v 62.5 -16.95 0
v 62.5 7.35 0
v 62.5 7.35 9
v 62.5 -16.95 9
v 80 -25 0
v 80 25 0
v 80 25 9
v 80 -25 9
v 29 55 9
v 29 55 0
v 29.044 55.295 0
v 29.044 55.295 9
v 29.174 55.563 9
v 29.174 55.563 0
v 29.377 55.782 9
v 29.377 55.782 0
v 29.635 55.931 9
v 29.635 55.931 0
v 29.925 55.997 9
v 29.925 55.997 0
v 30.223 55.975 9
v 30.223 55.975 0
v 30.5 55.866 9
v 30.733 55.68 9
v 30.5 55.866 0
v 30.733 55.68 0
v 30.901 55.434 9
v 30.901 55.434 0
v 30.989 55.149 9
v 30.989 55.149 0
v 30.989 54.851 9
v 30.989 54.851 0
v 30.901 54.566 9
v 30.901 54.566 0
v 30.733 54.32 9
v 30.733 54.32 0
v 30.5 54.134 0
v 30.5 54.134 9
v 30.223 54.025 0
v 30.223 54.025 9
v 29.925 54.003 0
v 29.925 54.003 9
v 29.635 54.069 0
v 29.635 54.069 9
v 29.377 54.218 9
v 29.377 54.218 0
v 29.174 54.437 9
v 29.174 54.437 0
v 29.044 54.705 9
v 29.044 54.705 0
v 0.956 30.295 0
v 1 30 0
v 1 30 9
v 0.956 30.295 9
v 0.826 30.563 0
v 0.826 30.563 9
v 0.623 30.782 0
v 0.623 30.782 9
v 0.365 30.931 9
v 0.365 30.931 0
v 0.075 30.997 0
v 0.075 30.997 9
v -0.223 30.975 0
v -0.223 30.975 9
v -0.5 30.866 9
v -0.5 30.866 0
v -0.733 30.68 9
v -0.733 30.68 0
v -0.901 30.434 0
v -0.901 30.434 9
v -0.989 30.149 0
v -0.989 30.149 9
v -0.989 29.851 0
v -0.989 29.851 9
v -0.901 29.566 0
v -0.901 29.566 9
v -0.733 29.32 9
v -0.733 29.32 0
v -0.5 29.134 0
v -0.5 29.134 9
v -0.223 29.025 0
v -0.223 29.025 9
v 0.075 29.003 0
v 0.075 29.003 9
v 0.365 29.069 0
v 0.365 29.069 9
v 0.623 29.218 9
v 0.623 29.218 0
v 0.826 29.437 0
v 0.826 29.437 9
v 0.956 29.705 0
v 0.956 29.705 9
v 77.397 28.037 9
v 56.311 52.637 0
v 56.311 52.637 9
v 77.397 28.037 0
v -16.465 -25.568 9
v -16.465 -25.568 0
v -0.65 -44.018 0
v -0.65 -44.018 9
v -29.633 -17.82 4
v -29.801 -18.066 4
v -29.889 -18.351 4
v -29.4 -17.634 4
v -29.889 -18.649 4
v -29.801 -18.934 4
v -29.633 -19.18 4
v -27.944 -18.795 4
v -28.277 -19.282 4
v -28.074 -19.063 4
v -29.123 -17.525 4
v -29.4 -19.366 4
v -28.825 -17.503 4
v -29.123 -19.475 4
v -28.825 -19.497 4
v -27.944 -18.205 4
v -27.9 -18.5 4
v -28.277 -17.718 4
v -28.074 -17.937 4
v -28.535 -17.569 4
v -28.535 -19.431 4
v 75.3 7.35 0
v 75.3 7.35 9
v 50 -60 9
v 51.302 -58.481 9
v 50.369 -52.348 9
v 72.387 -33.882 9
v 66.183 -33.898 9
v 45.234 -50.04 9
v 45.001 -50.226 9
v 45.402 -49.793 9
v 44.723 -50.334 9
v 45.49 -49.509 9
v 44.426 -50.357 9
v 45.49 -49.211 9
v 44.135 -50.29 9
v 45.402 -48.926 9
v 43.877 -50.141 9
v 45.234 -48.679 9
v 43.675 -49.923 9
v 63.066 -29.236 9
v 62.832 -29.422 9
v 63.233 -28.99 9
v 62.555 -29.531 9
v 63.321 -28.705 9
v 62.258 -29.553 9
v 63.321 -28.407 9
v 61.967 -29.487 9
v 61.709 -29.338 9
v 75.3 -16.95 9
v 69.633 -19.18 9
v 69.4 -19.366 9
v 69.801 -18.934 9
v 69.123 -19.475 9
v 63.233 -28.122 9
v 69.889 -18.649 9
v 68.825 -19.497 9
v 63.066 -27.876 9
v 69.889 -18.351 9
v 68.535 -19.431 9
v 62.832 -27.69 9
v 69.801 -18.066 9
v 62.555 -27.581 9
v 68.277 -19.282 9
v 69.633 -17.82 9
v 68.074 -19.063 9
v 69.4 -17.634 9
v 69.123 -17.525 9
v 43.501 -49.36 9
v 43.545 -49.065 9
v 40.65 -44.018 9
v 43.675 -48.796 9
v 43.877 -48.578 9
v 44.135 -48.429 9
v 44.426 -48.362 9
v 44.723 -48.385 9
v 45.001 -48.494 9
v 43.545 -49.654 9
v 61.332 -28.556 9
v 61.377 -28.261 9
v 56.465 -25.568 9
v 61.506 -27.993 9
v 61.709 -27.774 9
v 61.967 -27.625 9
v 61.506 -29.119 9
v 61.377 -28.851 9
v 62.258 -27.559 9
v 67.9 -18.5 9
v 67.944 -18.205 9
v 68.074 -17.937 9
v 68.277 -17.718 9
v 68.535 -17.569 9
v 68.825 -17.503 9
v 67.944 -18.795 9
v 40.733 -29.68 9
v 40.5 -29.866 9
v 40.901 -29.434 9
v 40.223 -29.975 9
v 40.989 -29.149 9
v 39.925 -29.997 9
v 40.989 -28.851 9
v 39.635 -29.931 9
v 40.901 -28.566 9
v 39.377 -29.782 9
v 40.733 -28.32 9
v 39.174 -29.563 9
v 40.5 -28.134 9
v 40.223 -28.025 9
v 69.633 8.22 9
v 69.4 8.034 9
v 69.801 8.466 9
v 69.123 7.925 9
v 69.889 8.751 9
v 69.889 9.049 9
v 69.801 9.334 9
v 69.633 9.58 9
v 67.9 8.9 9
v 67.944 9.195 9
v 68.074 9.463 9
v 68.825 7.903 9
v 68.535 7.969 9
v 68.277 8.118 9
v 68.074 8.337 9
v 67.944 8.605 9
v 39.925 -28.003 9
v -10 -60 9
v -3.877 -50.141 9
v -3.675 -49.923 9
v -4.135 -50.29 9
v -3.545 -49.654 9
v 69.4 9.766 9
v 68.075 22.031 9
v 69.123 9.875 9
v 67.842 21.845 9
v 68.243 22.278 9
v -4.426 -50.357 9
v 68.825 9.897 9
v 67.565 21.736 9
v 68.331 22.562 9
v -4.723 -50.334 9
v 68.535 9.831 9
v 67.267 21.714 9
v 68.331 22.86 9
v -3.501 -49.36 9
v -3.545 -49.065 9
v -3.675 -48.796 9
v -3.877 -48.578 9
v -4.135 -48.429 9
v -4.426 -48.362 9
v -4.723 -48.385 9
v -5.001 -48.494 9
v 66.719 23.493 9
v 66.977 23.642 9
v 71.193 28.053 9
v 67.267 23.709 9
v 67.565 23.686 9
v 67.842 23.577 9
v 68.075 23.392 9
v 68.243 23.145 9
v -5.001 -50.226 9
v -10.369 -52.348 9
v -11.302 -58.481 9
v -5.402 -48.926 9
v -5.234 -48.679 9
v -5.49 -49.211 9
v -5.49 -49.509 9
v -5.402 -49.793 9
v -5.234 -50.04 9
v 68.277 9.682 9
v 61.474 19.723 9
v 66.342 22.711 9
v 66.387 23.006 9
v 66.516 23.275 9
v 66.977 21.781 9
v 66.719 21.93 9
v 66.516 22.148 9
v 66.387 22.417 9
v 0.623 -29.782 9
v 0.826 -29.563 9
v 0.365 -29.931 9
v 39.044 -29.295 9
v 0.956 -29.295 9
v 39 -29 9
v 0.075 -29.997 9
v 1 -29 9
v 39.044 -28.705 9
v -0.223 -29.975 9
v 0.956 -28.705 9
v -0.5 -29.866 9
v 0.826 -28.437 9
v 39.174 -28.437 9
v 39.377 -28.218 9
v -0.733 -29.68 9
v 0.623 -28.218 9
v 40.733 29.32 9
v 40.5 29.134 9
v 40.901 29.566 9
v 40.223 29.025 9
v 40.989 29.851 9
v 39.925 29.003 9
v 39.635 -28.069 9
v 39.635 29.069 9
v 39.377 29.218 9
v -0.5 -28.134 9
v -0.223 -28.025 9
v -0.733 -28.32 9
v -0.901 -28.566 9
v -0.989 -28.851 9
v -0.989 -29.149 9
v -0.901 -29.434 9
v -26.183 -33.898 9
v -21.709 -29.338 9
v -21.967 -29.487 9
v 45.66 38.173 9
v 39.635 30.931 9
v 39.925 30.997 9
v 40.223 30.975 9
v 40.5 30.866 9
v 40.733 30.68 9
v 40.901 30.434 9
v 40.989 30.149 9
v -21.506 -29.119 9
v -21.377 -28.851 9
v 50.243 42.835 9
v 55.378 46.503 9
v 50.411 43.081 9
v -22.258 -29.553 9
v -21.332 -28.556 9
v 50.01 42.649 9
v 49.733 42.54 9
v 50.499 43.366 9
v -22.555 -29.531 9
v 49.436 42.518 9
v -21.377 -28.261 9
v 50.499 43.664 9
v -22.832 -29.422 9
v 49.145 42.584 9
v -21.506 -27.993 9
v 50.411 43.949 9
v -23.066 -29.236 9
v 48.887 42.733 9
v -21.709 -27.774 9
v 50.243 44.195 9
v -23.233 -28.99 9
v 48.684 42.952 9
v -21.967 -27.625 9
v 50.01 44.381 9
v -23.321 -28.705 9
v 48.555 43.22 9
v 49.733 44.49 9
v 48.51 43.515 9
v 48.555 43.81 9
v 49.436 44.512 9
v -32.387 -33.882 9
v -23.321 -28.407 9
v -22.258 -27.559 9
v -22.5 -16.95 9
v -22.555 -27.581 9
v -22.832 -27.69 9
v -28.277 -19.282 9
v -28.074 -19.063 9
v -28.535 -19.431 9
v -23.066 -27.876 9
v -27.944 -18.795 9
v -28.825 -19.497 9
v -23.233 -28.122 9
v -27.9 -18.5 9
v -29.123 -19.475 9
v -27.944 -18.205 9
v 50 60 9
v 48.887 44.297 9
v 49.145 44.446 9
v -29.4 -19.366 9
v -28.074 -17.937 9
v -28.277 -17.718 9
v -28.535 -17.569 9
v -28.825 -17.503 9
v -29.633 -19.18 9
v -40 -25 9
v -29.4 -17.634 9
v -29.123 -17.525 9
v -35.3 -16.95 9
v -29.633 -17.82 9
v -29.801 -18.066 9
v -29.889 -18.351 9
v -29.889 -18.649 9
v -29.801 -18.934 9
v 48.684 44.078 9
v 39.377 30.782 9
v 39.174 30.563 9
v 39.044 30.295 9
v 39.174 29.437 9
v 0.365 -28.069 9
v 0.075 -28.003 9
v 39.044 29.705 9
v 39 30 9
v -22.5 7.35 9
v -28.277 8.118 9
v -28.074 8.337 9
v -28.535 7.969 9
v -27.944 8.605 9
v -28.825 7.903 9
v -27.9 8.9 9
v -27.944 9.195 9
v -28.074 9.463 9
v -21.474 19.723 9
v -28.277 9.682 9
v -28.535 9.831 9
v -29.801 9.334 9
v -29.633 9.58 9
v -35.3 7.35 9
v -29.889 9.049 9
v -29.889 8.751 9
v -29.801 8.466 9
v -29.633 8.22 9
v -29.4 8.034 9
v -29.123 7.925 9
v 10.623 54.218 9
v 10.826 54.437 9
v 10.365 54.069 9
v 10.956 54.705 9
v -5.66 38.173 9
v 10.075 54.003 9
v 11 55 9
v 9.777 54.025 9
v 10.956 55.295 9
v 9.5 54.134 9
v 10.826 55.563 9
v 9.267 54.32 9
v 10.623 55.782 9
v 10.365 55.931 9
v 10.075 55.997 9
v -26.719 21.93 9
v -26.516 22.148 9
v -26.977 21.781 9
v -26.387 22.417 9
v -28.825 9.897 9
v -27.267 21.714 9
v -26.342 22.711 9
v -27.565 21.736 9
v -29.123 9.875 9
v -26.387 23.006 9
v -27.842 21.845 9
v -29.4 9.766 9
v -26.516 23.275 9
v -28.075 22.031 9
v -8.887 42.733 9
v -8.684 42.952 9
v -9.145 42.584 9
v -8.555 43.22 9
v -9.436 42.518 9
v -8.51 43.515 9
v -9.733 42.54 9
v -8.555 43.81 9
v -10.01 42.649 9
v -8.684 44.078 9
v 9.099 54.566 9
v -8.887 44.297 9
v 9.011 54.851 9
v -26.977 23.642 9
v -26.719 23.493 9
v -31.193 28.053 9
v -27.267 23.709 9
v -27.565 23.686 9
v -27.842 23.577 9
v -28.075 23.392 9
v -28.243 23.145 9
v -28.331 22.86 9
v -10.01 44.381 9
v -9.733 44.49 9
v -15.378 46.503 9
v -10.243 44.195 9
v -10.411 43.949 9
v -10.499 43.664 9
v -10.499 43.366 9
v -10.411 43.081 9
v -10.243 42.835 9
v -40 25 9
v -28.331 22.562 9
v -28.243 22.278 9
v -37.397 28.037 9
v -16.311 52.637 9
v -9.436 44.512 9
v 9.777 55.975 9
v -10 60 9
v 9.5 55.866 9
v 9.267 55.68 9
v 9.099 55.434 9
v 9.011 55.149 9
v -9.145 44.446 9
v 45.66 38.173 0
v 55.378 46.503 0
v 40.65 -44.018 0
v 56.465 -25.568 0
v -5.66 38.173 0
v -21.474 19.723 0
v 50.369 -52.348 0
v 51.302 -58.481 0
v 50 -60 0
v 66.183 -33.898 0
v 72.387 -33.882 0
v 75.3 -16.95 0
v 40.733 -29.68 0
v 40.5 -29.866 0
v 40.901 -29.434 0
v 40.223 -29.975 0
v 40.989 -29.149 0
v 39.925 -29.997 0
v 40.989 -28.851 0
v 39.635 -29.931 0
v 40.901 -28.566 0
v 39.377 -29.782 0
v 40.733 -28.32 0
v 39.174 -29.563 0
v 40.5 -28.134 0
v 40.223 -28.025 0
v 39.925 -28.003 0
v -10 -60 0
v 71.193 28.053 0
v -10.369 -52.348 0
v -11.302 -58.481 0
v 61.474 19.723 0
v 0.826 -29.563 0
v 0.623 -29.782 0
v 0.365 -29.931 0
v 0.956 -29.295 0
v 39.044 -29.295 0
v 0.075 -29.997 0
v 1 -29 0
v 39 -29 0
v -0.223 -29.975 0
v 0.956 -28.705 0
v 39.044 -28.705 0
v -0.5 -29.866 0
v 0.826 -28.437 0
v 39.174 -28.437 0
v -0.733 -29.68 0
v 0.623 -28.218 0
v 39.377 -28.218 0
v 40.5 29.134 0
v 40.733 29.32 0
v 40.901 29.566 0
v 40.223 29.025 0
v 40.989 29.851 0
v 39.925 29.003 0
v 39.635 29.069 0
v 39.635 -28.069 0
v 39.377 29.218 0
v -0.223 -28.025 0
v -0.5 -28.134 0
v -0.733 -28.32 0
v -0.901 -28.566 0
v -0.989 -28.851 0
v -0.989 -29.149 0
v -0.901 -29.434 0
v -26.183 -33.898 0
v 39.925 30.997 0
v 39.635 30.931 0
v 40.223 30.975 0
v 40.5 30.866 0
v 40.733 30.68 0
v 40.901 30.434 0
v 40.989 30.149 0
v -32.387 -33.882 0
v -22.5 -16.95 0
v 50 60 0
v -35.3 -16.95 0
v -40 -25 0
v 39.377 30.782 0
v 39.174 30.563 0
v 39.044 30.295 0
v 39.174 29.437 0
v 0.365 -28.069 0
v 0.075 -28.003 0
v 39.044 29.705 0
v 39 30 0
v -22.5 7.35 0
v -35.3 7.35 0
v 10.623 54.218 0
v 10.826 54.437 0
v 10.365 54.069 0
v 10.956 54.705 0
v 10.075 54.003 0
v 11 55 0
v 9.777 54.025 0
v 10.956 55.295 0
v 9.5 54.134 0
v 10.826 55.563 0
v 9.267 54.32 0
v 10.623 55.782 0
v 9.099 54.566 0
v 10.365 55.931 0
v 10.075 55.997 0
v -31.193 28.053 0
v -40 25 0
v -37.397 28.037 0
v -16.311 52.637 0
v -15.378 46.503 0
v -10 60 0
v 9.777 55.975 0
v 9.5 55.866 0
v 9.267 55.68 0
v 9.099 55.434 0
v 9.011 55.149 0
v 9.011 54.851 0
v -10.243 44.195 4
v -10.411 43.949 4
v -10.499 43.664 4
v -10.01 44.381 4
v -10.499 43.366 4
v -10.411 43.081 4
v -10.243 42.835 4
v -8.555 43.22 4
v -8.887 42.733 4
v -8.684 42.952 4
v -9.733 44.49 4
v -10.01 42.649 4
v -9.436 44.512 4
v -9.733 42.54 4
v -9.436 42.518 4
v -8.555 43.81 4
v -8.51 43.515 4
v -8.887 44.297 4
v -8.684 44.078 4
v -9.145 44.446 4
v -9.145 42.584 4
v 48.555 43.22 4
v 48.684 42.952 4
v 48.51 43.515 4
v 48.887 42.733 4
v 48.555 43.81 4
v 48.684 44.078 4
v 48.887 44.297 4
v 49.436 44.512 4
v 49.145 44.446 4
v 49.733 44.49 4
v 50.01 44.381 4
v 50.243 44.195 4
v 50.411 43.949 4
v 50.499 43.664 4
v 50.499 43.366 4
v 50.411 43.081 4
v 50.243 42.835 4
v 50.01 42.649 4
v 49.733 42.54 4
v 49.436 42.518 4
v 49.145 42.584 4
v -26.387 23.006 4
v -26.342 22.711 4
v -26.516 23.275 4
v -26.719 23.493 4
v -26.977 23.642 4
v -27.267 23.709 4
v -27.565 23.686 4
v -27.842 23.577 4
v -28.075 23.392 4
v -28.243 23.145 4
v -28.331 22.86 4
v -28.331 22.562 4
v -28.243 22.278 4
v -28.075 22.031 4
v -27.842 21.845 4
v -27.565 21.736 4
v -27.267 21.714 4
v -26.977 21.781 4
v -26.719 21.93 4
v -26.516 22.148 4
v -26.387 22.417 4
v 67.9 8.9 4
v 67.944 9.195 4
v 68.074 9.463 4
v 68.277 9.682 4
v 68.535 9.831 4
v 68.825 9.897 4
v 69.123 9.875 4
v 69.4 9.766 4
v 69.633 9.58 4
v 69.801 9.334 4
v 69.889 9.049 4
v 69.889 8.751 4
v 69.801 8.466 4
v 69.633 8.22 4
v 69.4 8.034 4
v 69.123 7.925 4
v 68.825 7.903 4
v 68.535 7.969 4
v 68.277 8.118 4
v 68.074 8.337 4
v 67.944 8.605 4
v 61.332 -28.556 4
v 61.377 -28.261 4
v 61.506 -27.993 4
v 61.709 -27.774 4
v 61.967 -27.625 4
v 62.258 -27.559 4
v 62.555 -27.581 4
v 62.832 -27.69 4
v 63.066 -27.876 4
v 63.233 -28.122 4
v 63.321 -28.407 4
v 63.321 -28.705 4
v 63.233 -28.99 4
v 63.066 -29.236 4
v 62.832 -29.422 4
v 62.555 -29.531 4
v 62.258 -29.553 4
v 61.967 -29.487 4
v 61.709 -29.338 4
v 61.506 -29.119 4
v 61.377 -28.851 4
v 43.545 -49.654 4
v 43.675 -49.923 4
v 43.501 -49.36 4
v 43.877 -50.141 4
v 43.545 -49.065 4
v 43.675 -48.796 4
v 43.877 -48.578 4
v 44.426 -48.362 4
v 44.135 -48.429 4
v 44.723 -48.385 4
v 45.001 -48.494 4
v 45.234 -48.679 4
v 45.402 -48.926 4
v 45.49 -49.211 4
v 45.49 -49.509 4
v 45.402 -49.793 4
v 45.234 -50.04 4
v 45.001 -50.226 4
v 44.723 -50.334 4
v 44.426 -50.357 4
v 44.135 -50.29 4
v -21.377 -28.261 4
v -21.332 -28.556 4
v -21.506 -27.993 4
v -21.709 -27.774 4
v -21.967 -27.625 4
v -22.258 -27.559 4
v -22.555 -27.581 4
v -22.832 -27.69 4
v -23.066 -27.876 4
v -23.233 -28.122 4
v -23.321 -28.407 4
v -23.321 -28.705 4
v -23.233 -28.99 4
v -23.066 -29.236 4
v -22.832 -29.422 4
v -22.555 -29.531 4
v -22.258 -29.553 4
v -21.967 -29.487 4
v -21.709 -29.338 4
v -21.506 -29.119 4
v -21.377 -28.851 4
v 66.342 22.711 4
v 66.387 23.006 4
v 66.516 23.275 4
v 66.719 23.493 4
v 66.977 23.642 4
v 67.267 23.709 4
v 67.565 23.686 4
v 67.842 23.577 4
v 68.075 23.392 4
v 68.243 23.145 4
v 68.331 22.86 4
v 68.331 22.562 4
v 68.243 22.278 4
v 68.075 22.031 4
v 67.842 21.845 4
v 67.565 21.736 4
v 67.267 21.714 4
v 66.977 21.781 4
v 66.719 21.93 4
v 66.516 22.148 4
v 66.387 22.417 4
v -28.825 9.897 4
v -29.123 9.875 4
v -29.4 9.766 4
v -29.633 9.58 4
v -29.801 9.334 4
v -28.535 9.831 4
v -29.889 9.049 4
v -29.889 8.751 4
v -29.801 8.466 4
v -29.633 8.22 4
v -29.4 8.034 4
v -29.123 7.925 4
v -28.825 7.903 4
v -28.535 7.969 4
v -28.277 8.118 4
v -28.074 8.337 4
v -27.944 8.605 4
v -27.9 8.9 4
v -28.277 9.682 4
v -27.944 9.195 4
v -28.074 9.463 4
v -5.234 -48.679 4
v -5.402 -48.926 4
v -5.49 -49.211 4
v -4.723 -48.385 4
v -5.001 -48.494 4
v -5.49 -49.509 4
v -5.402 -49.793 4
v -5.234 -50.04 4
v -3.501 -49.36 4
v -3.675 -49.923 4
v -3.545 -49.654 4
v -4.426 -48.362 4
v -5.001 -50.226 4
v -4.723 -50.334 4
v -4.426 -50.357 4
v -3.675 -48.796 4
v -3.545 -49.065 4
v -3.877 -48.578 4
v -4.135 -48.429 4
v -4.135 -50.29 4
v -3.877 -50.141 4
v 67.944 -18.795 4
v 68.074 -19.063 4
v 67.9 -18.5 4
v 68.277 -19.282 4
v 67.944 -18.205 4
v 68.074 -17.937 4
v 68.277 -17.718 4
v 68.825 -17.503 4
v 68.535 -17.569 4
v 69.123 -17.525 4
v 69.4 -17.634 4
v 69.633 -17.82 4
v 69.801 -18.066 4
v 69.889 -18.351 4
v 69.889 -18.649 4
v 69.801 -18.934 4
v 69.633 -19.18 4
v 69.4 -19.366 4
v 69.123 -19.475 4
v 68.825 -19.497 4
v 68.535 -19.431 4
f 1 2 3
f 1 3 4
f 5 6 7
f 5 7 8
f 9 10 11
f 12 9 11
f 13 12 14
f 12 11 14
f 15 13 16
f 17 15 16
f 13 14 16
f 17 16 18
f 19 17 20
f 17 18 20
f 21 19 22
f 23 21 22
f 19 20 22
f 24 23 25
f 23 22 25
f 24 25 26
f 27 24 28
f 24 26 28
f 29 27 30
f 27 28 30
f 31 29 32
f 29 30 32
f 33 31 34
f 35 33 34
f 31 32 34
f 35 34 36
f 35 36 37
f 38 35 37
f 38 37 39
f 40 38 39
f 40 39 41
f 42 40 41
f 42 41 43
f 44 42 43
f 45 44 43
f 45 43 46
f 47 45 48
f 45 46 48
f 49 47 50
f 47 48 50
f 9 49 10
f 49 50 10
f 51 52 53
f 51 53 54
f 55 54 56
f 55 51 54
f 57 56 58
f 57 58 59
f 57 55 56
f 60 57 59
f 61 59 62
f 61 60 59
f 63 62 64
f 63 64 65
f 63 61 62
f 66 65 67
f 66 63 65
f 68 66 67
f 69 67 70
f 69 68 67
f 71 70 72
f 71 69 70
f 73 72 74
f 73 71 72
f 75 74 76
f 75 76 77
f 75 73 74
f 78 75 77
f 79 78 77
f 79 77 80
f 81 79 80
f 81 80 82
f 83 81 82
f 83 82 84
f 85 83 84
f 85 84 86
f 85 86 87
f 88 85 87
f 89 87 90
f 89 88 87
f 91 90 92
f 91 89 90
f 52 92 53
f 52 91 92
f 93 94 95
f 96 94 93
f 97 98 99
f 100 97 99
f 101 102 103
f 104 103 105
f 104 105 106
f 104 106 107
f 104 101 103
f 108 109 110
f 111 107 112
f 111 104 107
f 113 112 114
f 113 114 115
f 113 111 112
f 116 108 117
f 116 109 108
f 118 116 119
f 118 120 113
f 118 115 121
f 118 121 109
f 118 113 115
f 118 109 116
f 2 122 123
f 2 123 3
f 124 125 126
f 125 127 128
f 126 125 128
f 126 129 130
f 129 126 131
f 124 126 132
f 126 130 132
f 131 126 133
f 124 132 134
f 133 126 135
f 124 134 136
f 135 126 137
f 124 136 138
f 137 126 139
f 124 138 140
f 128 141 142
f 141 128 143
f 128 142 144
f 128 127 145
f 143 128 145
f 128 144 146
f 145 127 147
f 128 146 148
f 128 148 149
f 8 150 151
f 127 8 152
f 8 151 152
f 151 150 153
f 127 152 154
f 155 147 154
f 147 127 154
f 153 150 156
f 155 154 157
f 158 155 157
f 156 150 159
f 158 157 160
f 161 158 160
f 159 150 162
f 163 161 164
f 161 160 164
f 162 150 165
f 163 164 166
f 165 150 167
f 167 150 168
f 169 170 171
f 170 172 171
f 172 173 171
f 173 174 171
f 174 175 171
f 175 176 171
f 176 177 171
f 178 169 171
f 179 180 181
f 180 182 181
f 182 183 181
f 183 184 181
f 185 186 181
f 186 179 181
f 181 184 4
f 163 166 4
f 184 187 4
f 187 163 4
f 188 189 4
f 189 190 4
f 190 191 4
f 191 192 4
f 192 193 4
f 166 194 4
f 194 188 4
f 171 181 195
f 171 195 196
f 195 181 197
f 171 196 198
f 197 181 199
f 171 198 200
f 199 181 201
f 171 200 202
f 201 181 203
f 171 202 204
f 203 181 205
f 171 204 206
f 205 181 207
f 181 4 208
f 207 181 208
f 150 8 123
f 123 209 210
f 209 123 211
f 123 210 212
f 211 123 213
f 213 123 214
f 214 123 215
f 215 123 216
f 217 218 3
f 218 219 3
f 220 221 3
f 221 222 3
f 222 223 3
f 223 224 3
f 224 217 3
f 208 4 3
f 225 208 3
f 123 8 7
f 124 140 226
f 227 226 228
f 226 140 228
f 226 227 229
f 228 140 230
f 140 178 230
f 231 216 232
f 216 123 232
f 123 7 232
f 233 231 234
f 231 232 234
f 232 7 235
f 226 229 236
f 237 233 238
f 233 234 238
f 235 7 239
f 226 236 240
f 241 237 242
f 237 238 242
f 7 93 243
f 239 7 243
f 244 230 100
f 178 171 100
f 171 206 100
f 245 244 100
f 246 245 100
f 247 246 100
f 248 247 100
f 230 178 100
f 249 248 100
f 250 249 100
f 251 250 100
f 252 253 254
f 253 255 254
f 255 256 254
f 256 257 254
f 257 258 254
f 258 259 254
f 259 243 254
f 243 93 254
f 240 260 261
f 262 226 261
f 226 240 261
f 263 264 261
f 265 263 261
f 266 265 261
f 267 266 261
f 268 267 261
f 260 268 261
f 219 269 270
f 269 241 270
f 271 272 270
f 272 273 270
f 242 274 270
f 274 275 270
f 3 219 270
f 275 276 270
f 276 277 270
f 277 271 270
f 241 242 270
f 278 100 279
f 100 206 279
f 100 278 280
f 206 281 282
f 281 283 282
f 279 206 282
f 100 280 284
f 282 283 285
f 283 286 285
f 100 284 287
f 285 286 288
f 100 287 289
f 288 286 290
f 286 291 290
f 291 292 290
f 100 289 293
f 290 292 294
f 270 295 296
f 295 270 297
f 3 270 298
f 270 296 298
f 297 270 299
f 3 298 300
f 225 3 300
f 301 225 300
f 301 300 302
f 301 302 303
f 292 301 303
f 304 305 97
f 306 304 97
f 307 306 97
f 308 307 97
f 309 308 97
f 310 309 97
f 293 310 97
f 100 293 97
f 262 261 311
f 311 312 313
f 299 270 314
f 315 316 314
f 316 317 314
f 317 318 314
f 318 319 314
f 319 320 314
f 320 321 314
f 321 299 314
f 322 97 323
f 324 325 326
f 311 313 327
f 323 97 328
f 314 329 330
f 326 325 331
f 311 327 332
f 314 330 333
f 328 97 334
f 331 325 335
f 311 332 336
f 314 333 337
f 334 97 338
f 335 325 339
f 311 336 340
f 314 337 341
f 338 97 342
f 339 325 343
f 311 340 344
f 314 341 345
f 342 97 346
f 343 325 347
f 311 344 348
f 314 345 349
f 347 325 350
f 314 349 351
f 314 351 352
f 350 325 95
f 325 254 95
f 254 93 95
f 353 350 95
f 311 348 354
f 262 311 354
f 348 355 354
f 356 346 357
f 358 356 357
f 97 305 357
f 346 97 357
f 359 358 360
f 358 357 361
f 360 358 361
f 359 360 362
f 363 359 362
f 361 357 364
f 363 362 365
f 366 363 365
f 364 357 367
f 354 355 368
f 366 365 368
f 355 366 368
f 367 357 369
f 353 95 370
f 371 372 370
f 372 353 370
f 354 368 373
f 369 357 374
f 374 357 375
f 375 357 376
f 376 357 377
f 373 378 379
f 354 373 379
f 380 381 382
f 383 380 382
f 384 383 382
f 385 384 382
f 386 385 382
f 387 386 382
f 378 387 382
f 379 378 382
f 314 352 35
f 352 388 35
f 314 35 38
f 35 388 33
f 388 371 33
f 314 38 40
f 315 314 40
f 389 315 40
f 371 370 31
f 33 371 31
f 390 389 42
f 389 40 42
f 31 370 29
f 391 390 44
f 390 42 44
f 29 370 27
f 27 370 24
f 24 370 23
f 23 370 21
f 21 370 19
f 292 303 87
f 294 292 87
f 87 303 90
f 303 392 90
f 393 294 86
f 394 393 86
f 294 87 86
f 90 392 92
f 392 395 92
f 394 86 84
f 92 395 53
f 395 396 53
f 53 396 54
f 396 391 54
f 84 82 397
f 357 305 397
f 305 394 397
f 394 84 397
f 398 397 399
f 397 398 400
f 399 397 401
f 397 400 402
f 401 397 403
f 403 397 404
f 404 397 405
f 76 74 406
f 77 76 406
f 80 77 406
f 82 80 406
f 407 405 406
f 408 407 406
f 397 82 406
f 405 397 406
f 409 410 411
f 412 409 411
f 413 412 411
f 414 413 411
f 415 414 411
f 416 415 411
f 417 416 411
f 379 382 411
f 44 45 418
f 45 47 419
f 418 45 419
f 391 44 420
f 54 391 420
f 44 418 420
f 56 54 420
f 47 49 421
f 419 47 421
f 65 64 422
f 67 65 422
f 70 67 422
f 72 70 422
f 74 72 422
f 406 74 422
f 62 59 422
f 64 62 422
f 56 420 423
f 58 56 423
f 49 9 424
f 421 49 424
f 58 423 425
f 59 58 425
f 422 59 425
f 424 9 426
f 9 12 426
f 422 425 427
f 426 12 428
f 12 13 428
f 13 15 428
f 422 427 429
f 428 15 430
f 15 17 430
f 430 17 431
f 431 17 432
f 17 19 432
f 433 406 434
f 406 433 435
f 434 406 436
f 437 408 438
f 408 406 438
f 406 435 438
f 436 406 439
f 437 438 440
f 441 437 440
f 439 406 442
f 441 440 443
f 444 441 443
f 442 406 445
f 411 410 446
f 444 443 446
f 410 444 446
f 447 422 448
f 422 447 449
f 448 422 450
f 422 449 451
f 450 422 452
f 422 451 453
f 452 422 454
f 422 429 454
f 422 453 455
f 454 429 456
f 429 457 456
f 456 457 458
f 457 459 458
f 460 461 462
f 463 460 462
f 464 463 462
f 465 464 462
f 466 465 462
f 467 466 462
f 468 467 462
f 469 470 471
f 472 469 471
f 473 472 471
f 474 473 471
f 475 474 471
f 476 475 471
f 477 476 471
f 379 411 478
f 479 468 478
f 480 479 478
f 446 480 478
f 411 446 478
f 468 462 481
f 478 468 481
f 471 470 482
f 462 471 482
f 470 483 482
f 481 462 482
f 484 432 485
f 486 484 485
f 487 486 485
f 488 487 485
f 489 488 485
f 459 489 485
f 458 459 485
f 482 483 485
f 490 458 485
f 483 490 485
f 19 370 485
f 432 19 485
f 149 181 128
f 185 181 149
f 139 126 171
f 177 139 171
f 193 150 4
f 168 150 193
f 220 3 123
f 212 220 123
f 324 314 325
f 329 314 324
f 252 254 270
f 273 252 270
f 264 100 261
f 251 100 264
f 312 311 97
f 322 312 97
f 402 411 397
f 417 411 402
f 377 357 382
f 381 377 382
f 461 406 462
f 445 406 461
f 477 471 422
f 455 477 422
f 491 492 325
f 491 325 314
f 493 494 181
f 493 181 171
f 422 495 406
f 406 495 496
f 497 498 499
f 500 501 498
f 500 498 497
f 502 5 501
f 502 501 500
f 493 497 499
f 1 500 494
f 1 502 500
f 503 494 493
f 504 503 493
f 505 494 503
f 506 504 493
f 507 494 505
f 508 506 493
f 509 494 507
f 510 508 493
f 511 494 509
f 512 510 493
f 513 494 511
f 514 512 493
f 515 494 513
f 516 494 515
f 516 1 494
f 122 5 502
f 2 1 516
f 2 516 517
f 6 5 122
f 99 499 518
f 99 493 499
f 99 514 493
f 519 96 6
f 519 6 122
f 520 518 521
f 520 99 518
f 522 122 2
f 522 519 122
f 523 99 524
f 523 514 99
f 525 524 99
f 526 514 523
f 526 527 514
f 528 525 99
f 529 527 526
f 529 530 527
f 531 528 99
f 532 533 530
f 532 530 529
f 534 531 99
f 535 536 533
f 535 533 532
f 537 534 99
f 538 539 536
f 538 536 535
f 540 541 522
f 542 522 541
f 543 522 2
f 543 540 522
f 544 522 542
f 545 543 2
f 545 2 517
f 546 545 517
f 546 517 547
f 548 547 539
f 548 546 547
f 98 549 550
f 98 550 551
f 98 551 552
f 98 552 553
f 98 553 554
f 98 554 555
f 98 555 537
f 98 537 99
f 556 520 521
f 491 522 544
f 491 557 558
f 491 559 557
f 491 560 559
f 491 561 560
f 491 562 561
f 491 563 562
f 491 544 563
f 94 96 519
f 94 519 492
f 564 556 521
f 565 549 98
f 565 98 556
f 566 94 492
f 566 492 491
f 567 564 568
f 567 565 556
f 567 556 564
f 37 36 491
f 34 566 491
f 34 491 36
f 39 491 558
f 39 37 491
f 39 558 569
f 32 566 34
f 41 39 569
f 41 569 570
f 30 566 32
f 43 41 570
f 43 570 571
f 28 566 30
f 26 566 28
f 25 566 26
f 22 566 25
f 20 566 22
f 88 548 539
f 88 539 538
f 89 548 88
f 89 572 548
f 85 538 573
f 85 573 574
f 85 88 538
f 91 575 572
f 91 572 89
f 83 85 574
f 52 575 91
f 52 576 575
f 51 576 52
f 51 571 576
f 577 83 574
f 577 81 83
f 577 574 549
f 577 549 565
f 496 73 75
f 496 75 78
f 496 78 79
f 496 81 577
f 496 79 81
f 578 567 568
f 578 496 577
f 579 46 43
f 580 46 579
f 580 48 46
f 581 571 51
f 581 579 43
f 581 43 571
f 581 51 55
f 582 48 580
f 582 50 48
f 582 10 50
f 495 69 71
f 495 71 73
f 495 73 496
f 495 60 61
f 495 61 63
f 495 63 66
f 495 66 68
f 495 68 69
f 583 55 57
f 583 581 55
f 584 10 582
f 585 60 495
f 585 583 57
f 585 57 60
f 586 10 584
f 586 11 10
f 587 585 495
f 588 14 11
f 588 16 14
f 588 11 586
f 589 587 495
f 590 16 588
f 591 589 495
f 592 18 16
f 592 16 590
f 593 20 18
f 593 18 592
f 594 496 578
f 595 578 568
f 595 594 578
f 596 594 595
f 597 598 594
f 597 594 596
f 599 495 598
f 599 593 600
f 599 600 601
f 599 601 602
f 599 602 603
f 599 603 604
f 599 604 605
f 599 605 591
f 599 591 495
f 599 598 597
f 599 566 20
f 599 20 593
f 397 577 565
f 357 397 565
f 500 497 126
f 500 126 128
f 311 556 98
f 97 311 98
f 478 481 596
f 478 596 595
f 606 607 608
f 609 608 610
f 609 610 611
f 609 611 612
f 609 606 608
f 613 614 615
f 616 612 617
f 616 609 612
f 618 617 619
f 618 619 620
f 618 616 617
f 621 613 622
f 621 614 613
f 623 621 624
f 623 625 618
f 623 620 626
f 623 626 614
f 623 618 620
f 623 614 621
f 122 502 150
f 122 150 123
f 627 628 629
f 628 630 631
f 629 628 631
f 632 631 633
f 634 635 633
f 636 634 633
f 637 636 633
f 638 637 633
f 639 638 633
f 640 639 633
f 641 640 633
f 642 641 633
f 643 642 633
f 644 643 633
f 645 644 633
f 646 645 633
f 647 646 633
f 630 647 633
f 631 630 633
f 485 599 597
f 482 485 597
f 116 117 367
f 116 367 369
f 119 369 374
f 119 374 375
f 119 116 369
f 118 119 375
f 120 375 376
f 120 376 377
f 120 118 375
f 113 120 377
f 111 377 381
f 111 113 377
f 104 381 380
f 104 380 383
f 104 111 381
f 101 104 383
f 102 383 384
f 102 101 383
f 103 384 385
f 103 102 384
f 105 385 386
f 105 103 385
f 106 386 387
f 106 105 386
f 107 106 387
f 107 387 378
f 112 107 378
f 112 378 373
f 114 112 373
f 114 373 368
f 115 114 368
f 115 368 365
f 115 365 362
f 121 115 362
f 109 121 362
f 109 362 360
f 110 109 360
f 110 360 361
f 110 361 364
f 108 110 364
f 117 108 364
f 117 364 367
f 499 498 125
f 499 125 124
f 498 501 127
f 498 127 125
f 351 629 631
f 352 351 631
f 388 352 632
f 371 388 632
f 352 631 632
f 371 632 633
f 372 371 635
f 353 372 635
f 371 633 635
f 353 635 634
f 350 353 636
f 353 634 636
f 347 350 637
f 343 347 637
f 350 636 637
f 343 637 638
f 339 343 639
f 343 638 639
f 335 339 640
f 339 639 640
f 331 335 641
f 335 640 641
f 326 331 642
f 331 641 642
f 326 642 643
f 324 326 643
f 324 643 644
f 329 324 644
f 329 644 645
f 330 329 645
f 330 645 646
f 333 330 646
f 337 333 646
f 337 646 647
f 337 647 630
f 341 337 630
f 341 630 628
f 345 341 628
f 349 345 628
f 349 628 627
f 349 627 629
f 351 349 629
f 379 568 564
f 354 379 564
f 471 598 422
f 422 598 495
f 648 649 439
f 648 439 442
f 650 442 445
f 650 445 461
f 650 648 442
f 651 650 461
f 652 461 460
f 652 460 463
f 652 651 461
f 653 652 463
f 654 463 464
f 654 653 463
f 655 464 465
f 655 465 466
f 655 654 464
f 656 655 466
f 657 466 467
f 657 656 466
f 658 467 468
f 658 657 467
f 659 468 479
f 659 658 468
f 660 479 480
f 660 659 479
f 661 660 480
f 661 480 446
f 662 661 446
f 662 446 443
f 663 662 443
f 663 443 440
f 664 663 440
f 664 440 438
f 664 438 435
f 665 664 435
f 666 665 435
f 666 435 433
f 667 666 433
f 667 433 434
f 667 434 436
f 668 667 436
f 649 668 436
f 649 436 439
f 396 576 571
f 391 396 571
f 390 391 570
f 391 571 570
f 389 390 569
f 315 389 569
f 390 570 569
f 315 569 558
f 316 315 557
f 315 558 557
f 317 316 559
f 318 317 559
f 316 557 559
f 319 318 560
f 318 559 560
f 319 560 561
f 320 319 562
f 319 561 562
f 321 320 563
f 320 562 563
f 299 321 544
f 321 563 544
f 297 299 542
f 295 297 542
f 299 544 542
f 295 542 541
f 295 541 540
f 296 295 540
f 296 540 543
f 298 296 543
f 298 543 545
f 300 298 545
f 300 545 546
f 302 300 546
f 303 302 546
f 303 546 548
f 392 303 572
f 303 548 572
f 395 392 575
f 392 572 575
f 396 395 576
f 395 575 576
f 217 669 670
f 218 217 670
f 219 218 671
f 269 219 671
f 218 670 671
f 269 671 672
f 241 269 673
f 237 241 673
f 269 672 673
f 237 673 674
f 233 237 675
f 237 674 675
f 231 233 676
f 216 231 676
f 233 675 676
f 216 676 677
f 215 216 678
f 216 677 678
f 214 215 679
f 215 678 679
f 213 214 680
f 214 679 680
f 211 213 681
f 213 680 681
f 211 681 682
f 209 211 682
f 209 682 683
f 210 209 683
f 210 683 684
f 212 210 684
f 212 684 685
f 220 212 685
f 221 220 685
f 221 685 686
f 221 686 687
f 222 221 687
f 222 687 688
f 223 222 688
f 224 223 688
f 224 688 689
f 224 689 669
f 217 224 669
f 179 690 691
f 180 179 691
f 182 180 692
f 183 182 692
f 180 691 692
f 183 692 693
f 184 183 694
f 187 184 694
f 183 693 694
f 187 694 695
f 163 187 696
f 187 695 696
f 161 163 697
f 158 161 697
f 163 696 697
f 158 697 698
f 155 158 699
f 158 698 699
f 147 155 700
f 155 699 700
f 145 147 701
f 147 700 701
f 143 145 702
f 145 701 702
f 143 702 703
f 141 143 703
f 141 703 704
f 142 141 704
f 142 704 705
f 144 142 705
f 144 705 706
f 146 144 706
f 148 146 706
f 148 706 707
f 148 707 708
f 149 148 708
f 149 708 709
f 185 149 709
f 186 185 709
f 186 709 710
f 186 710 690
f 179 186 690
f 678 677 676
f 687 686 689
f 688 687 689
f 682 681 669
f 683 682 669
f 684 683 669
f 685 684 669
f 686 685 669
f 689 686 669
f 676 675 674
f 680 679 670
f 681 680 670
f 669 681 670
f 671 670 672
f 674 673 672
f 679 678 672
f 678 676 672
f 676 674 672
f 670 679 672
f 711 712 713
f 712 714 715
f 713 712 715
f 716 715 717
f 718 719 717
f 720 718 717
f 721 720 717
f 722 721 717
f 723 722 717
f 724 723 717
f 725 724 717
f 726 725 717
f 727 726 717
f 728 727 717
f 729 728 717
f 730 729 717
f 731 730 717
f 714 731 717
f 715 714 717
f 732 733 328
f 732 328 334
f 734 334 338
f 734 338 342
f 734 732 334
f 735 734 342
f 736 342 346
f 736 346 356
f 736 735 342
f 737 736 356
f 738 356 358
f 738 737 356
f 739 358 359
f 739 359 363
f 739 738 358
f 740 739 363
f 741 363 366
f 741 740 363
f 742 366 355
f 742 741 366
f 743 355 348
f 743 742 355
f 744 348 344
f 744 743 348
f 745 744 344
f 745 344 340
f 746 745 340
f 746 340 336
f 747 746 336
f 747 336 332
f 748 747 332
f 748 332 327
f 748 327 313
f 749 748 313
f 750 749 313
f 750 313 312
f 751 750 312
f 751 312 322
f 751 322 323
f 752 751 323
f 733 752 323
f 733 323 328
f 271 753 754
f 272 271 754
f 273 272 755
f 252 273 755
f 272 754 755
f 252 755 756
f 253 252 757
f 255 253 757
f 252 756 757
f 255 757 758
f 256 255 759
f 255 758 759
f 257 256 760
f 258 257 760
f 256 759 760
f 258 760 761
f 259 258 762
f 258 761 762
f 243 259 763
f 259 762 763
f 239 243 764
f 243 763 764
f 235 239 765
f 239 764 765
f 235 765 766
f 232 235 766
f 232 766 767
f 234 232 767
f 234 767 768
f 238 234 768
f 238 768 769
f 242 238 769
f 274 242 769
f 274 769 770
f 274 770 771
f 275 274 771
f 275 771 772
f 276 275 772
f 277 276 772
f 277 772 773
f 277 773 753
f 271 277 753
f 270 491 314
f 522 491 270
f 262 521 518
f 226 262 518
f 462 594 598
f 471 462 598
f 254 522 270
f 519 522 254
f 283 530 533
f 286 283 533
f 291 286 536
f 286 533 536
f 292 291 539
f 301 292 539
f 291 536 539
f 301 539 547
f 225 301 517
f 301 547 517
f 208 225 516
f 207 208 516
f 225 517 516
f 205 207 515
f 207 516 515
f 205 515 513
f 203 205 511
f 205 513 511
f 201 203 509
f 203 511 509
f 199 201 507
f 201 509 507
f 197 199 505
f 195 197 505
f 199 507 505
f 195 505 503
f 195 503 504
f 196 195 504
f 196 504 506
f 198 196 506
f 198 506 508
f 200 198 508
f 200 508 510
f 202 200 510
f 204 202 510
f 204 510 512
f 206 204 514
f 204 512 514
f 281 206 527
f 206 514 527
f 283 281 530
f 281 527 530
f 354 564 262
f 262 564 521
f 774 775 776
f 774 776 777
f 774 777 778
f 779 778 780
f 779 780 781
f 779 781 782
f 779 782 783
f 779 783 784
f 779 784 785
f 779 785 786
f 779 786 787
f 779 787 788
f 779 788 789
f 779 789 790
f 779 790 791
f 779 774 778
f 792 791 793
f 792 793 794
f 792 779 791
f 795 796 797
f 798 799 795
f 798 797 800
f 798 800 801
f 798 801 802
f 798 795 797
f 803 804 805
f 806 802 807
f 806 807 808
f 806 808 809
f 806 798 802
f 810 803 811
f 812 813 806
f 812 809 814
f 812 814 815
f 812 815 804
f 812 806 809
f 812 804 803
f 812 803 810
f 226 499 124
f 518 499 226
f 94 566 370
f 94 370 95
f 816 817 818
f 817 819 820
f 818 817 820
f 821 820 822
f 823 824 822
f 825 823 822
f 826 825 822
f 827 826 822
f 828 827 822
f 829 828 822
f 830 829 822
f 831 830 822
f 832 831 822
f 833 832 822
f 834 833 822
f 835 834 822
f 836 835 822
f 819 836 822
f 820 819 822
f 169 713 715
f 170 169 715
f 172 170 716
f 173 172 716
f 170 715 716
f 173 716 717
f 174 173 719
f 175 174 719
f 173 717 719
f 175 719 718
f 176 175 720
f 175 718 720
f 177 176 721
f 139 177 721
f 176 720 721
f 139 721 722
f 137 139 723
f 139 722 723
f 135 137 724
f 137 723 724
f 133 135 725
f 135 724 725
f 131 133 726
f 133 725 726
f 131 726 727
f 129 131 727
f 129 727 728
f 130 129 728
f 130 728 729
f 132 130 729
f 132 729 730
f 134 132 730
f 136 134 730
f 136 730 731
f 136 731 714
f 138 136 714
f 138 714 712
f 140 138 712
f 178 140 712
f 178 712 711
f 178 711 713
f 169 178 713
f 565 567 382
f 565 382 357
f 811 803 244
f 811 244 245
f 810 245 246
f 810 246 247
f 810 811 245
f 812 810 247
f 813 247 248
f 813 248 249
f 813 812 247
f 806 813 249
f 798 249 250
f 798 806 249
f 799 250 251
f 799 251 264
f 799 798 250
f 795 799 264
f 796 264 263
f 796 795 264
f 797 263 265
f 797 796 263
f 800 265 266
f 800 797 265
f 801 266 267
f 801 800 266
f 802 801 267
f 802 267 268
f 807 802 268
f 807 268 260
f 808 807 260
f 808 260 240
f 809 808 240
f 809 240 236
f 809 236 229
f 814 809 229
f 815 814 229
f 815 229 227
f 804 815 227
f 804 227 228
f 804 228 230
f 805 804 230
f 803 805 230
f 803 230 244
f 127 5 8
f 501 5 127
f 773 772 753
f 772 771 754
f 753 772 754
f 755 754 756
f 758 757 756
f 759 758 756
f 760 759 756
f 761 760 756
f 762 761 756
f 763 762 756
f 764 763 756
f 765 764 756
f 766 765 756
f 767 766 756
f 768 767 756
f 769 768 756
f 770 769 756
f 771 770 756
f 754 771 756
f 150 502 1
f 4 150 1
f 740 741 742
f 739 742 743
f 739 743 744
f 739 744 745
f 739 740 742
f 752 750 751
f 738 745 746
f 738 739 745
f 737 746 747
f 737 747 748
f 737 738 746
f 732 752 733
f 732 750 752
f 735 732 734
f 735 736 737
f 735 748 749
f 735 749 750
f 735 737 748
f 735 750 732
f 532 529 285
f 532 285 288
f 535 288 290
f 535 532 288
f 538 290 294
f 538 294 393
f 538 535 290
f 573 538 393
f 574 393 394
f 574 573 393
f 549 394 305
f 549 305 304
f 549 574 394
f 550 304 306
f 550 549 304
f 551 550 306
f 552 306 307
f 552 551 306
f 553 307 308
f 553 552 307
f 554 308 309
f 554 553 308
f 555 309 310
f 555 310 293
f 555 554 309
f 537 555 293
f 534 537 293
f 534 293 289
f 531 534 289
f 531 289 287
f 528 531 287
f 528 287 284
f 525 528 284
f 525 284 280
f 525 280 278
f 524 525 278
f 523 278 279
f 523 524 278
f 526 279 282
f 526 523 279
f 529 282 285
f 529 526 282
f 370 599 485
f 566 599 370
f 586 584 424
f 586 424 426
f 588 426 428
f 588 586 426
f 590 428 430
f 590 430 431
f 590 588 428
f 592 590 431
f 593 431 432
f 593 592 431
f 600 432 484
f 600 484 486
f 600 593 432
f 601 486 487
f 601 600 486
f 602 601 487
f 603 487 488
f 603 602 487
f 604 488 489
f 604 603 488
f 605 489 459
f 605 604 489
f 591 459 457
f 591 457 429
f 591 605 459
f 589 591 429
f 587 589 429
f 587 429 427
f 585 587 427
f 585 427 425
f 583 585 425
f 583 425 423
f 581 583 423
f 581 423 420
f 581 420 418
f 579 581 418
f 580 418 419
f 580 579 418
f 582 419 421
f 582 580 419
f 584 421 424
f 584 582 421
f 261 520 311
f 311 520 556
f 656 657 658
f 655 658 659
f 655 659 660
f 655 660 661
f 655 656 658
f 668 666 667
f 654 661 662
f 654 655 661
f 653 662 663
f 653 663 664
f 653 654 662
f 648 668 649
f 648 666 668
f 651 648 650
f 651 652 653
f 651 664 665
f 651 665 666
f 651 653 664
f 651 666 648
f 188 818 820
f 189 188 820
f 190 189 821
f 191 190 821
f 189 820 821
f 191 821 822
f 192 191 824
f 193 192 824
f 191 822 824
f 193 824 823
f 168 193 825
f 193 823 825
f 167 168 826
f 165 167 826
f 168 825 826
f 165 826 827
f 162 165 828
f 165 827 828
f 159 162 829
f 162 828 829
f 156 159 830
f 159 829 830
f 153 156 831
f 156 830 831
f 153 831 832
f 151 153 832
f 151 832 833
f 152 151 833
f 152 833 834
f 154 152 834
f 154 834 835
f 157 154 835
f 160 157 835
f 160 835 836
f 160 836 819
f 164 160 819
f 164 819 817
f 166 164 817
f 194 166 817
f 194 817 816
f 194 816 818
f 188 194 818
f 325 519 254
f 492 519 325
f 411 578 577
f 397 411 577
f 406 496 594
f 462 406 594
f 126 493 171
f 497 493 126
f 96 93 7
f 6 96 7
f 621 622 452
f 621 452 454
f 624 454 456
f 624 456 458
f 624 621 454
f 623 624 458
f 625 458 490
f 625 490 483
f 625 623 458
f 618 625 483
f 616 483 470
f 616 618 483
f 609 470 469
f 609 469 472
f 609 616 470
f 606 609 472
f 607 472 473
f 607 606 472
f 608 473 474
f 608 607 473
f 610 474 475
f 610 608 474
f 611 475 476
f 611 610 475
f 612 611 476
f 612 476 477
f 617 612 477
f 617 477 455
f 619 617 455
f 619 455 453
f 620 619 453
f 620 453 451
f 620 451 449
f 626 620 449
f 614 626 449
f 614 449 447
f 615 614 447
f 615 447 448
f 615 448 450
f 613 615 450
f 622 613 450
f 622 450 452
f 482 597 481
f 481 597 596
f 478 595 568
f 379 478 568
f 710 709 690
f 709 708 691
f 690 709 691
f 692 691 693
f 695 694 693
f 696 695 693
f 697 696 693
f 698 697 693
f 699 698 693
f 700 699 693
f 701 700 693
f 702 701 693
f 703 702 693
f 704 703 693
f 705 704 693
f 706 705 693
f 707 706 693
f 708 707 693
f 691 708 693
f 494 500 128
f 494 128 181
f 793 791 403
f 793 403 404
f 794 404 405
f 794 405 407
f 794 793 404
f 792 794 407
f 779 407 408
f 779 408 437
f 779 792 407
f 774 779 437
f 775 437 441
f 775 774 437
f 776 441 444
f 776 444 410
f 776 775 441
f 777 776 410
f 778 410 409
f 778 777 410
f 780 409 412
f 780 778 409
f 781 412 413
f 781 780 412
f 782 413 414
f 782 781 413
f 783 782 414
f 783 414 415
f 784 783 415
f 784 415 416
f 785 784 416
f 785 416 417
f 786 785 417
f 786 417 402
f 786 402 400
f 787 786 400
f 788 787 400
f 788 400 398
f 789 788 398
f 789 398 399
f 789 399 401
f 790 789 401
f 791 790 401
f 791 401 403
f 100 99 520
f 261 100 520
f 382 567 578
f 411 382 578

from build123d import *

# Parameters (mm, degrees)
F0_R     = 1
F0_W     = 12.8
F0_H     = 4.05
F1_DEPTH = 9
F2_DEPTH = 4


with BuildPart() as f1:
    # F0 (on Top) → F1 (new body)
    with BuildSketch(Plane.XY):
        Polygon((-40, -21), (-40, -25), (-32.387223, -33.881573), (-28.818717, -30.822853), (-19.100233, -22.492724), (-16.464528, -25.567713), (-0.650297, -44.017649), (1.985408, -47.092638), (-7.733077, -55.422767), (-11.301583, -58.481487), (-10, -60), (20, -60), (20, 60), (-10, 60), (-16.311194, 52.63694), (-12.742688, 49.578221), (-3.024203, 41.248091), (-5.659909, 38.173102), (-21.474139, 19.723167), (-24.109844, 16.648177), (-33.828328, 24.978307), (-37.396835, 28.037026), (-40, 25), (-40, 11.4), (-35.3, 11.4), (-22.5, 11.4), (-22.5, 7.35), (-22.5, -16.95), (-22.5, -21), (-35.3, -21), align=None)
        with Locations((0, -29)):
            Circle(F0_R, mode=Mode.SUBTRACT)
        with Locations((0, 30)):
            Circle(F0_R, mode=Mode.SUBTRACT)
        with Locations((10, 55)):
            Circle(F0_R, mode=Mode.SUBTRACT)
        Polygon((-40, 11.4), (-40, -21), (-35.3, -21), (-35.3, -16.95), (-35.3, 7.35), (-35.3, 11.4), align=None)
        Polygon((-28.818717, -30.822853), (-32.387223, -33.881573), (-11.301583, -58.481487), (-7.733077, -55.422767), (-10.368782, -52.347778), (-26.183012, -33.897843), align=None)
        Polygon((-16.311194, 52.63694), (-37.396835, 28.037026), (-33.828328, 24.978307), (-31.192623, 28.053296), (-15.378393, 46.503232), (-12.742688, 49.578221), align=None)
        Polygon((-10.368782, -52.347778), (-7.733077, -55.422767), (1.985408, -47.092638), (-0.650297, -44.017649), align=None)
        with Locations((-4.500813, -49.359561)):
            Circle(F0_R, mode=Mode.SUBTRACT)
        Polygon((-19.100233, -22.492724), (-28.818717, -30.822853), (-26.183012, -33.897843), (-16.464528, -25.567713), align=None)
        with Locations((-22.332497, -28.55593)):
            Circle(F0_R, mode=Mode.SUBTRACT)
        with Locations((-28.9, -18.975)):
            Rectangle(F0_W, F0_H)
        with Locations((-28.9, -18.5)):
            Circle(F0_R, mode=Mode.SUBTRACT)
        with Locations((-28.9, 9.375)):
            Rectangle(F0_W, F0_H)
        with Locations((-28.9, 8.9)):
            Circle(F0_R, mode=Mode.SUBTRACT)
        Polygon((-3.024203, 41.248091), (-12.742688, 49.578221), (-15.378393, 46.503232), (-5.659909, 38.173102), align=None)
        with Locations((-9.510424, 43.515015)):
            Circle(F0_R, mode=Mode.SUBTRACT)
        Polygon((-31.192623, 28.053296), (-33.828328, 24.978307), (-24.109844, 16.648177), (-21.474139, 19.723167), align=None)
        with Locations((-27.342108, 22.711384)):
            Circle(F0_R, mode=Mode.SUBTRACT)
    extrude(amount=F1_DEPTH)

    # F0 (on Top) → F2 (join)
    with BuildSketch(Plane.XY):
        with Locations((-9.510424, 43.515015)):
            Circle(F0_R)
        with Locations((-27.342108, 22.711384)):
            Circle(F0_R)
        with Locations((-28.9, 8.9)):
            Circle(F0_R)
        with Locations((-28.9, -18.5)):
            Circle(F0_R)
        with Locations((-22.332497, -28.55593)):
            Circle(F0_R)
        with Locations((-4.500813, -49.359561)):
            Circle(F0_R)
    extrude(amount=F2_DEPTH)

    # F3: F1 across face


with BuildPart() as f1_1:
    add(f1.part)
    add(f1.part.mirror(Plane(origin=(20, 0, 4.5), x_dir=(0, 1, 0), z_dir=(1, 0, 0))))


solid = f1_1.part
